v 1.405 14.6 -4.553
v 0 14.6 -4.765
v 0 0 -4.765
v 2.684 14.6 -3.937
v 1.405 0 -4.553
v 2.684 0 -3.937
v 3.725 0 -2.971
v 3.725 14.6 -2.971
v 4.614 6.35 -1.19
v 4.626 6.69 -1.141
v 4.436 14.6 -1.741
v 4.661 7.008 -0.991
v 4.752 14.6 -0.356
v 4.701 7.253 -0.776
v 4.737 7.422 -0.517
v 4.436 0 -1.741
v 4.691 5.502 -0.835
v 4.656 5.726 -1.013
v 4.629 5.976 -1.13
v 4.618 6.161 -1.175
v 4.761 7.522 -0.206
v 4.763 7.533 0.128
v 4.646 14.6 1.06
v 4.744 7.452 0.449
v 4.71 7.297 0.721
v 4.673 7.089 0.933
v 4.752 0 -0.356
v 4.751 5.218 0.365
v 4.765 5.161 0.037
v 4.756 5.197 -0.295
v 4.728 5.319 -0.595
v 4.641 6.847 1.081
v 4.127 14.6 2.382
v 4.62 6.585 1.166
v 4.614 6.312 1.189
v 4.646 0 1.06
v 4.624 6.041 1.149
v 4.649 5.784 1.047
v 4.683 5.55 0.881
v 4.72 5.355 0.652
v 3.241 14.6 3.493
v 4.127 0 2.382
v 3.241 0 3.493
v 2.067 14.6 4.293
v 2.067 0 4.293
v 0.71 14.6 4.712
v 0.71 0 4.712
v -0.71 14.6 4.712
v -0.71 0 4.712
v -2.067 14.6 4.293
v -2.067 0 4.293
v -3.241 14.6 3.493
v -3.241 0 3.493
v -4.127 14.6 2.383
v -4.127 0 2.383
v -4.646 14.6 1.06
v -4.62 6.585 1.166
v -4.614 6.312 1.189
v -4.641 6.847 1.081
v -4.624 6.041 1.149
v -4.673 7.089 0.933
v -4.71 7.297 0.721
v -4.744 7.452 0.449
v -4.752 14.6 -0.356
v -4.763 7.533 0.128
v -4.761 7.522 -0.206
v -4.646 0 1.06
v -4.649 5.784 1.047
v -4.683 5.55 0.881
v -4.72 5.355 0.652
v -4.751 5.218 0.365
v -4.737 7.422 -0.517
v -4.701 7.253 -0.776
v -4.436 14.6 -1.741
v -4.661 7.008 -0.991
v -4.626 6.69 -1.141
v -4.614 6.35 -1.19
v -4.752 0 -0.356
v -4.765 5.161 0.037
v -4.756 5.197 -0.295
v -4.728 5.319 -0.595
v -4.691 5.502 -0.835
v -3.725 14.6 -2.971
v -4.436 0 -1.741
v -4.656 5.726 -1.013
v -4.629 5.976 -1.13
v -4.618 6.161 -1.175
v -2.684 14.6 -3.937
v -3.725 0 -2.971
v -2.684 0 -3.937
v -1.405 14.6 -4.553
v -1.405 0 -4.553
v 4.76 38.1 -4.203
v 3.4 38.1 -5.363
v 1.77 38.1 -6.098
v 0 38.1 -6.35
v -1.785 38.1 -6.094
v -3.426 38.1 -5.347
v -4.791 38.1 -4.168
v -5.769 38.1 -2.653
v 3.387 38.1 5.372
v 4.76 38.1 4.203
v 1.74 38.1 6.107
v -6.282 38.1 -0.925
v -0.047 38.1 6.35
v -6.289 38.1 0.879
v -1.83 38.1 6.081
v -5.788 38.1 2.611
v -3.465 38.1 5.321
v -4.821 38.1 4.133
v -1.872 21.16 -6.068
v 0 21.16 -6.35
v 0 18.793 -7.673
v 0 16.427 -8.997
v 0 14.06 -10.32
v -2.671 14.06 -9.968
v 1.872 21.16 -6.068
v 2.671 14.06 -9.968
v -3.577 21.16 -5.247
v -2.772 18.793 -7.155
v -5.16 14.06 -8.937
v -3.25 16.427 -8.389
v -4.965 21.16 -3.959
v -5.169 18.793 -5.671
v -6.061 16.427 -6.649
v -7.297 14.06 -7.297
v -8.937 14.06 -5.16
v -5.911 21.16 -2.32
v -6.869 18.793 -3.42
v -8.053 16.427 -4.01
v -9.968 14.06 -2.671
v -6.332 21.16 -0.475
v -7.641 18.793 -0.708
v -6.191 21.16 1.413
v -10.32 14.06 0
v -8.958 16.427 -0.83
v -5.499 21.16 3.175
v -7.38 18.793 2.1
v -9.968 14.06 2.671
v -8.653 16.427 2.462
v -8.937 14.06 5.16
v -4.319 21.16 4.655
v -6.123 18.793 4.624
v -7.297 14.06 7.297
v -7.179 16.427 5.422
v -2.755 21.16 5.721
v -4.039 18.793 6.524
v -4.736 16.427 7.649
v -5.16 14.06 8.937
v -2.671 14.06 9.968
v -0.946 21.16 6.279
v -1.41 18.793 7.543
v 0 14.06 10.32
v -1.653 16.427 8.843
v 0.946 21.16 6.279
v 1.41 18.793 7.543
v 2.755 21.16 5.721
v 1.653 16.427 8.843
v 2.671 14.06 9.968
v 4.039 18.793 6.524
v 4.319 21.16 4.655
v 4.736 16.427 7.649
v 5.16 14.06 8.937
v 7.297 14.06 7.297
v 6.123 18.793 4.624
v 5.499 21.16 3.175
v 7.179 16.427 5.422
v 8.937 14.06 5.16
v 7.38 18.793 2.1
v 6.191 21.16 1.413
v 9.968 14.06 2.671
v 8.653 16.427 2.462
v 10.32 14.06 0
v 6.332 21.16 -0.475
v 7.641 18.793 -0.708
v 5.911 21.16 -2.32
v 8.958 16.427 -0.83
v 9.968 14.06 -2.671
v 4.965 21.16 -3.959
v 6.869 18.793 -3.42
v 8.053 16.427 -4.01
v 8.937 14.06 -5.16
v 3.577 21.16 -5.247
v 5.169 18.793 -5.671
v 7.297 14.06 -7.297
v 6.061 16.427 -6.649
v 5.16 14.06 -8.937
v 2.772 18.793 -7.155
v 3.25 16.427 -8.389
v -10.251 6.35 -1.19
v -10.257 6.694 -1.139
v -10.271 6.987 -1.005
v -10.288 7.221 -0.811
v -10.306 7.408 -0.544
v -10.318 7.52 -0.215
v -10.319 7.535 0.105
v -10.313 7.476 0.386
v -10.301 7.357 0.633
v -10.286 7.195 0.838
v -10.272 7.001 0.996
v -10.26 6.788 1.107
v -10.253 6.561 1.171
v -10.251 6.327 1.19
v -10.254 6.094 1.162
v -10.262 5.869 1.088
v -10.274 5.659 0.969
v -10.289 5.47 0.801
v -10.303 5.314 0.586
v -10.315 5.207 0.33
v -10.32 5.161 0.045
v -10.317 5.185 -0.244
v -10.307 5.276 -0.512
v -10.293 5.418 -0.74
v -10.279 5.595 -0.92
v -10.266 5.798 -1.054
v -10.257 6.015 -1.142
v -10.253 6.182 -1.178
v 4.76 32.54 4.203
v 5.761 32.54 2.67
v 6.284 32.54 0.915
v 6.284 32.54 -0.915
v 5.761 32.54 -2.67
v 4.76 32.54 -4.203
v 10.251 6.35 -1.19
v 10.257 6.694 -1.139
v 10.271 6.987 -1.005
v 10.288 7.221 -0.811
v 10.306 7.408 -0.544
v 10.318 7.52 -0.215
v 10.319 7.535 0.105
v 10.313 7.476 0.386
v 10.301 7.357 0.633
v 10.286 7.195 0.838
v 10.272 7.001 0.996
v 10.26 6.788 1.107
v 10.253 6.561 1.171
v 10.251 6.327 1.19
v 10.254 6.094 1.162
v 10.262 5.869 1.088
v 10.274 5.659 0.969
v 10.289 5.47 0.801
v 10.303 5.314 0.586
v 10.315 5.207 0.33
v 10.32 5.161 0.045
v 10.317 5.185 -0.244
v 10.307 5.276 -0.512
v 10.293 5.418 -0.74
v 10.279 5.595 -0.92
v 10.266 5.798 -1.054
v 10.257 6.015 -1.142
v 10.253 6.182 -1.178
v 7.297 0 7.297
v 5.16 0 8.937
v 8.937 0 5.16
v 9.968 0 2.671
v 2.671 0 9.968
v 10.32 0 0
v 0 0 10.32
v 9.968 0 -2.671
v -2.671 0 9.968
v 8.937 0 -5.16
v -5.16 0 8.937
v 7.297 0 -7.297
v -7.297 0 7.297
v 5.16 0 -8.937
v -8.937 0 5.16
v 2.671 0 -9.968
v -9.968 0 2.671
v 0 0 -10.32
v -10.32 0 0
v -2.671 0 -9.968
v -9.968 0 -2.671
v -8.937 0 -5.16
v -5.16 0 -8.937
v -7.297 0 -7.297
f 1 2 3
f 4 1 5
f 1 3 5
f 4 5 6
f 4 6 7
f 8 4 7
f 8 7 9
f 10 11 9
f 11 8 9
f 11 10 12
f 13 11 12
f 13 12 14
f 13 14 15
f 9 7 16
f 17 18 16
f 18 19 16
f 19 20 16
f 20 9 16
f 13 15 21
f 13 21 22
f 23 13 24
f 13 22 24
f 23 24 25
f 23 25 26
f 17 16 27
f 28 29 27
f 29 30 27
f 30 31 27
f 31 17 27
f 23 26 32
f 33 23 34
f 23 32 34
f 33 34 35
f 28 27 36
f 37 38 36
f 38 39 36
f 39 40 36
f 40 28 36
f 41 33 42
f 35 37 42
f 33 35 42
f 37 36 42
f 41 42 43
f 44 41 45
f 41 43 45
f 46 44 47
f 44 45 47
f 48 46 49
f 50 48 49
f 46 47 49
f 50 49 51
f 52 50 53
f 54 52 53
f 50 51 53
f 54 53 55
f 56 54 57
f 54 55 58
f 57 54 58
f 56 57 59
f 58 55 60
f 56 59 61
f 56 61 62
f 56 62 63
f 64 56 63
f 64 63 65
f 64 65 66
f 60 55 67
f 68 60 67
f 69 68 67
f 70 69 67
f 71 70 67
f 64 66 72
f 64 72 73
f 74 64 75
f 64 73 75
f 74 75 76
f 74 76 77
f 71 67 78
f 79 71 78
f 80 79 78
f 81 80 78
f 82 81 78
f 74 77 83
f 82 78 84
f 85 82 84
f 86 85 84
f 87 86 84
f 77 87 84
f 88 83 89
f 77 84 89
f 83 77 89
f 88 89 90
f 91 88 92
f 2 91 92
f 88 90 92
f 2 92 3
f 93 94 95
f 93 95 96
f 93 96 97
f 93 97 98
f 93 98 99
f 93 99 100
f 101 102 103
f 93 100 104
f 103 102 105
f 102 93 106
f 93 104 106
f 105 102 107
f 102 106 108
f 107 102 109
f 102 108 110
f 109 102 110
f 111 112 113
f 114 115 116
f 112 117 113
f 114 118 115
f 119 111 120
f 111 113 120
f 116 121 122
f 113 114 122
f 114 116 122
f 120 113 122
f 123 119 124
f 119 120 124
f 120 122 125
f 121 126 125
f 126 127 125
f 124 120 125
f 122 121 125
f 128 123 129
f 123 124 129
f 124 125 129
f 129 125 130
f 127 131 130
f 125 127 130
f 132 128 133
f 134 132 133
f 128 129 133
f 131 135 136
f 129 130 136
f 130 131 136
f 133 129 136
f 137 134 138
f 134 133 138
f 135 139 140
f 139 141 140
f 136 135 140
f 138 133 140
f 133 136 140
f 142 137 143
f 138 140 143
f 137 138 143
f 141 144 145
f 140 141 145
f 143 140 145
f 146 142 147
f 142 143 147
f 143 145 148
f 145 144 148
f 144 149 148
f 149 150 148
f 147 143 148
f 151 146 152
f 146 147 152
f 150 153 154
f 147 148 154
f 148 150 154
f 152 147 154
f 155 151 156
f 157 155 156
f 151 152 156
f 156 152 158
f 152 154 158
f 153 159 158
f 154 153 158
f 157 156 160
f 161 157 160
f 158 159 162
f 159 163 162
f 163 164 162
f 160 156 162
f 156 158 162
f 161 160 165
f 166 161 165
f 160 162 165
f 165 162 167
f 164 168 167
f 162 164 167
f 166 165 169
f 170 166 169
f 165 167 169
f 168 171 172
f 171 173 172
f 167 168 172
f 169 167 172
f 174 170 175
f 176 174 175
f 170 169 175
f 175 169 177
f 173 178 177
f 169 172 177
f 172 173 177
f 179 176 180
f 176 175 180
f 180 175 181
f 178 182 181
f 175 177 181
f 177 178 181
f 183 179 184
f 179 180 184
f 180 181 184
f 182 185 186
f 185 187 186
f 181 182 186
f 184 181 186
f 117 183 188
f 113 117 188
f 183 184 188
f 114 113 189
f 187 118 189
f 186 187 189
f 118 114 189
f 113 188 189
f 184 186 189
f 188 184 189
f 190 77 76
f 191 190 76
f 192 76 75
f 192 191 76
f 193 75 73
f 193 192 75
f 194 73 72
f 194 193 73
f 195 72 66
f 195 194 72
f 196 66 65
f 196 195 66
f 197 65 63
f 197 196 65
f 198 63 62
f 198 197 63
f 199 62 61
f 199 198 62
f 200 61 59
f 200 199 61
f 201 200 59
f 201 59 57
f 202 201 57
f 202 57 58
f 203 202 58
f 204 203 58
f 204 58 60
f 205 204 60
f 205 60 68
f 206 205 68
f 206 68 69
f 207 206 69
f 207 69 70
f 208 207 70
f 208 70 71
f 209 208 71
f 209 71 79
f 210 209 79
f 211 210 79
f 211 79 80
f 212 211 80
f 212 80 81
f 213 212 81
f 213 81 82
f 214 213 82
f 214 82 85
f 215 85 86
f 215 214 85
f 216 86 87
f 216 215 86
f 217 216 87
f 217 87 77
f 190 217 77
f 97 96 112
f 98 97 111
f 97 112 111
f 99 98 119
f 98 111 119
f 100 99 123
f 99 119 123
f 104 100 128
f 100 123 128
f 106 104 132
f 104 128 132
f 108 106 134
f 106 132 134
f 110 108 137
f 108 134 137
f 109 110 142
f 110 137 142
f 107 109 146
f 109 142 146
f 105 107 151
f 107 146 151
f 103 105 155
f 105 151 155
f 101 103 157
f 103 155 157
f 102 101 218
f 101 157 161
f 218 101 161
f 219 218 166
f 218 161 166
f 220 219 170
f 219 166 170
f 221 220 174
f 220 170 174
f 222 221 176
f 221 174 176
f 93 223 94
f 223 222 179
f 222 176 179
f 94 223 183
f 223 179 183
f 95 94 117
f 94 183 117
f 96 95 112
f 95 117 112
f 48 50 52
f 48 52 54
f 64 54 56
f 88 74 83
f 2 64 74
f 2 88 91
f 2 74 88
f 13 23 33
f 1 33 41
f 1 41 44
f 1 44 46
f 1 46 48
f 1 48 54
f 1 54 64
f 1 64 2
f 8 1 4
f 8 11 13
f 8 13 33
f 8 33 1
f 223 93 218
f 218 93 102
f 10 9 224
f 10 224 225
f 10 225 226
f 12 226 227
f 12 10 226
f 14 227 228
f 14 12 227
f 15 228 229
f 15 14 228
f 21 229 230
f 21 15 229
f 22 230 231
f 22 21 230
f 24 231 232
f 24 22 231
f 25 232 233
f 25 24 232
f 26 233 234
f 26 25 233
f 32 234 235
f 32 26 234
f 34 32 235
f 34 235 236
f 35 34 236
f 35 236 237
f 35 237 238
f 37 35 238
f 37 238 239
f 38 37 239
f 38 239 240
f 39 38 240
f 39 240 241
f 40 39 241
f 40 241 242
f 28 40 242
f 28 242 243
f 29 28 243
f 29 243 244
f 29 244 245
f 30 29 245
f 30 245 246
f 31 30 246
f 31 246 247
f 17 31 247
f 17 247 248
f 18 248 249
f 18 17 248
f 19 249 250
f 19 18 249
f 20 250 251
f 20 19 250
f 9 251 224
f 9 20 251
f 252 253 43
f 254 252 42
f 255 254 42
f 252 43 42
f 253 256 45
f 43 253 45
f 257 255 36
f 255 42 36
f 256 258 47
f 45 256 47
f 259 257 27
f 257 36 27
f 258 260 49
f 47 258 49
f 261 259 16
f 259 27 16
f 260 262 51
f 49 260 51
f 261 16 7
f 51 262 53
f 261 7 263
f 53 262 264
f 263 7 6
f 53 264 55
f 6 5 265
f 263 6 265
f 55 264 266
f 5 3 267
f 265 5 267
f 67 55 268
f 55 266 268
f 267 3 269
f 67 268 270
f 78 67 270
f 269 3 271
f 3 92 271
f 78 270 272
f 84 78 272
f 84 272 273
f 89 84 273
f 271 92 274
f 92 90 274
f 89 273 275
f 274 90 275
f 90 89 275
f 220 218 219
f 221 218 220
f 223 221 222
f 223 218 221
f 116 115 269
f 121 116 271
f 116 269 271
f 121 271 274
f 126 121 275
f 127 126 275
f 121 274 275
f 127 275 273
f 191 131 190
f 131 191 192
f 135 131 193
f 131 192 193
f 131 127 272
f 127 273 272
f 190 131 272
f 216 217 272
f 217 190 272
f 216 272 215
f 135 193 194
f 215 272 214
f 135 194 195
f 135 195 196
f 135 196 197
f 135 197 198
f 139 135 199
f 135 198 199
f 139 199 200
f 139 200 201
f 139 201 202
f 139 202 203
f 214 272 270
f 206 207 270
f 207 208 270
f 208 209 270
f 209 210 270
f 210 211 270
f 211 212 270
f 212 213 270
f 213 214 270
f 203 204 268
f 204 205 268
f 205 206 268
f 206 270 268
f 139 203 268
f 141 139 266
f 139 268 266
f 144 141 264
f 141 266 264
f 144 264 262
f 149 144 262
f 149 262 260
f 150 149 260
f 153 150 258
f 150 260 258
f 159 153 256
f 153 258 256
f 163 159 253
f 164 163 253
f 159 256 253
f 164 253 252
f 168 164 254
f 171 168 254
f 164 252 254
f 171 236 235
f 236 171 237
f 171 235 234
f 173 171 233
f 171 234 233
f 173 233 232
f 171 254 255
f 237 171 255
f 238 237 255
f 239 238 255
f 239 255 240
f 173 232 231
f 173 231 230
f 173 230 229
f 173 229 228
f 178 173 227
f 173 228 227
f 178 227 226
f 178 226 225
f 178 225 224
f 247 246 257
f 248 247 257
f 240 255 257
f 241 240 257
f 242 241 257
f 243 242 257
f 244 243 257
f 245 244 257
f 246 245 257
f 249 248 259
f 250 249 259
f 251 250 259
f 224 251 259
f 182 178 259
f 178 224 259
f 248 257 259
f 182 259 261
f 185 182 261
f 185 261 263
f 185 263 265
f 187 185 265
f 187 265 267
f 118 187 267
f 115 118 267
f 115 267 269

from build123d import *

# Parameters (mm, degrees)
SKETCH2_OUTSIDE_W       = 32.24
SKETCH2_OUTSIDE_H       = 32.24
CUT_EXTRUDE2_DEPTH      = 5.56
SKETCH3_R               = 4.765
CUT_EXTRUDE3_DEPTH      = 14.6
CUT_EXTRUDE4_DEPTH      = 41.799691175
CUT_EXTRUDE4_DEPTH_BACK = 41.799691175
SKETCH4_R               = 1.19


with BuildPart() as part:
    # Sketch1 → Revolve1 (revolve)
    with BuildSketch(Plane.XY, mode=Mode.PRIVATE) as revolve1_sk:
        Polygon((0, 0), (0, 38.1), (6.35, 38.1), (6.35, 21.16), (10.32, 14.06), (10.32, 0), align=None)
    revolve(revolve1_sk.sketch.rotate(Axis((0, 0, 0), (0, 1, 0)), 90), axis=Axis((0, 0, 0), (0, 1, 0)))

    # Sketch2 outside → Cut-Extrude2 (cut)
    with BuildSketch(Plane(origin=(0, 38.1, 0), x_dir=(1, 0, 0), z_dir=(0, 1, 0))):
        Rectangle(SKETCH2_OUTSIDE_W, SKETCH2_OUTSIDE_H)
        with BuildLine():
            Line((4.76, 4.20296324), (4.76, -4.20296324))
            ThreePointArc((4.76, -4.20296324), (-6.35, 0), (4.76, 4.20296324))
        make_face(mode=Mode.SUBTRACT)
    extrude(amount=-CUT_EXTRUDE2_DEPTH, mode=Mode.SUBTRACT)

    # Sketch3 → Cut-Extrude3 (cut)
    with BuildSketch(Plane.XZ):
        with Locations(Location((0, 0, 0), (0, 0, 270))):
            Circle(SKETCH3_R)
    extrude(amount=-CUT_EXTRUDE3_DEPTH, mode=Mode.SUBTRACT)

    # Sketch4 → Cut-Extrude4 (cut, two sides: drawn at the far end of the back side and taken through both)
    with BuildSketch(Plane(origin=(0, 0, 0), x_dir=(0, 0, -1), z_dir=(1, 0, 0)).offset(-CUT_EXTRUDE4_DEPTH_BACK)):
        with Locations((0, 6.35)):
            Circle(SKETCH4_R)
    extrude(amount=CUT_EXTRUDE4_DEPTH + CUT_EXTRUDE4_DEPTH_BACK, mode=Mode.SUBTRACT)


solid = part.part
